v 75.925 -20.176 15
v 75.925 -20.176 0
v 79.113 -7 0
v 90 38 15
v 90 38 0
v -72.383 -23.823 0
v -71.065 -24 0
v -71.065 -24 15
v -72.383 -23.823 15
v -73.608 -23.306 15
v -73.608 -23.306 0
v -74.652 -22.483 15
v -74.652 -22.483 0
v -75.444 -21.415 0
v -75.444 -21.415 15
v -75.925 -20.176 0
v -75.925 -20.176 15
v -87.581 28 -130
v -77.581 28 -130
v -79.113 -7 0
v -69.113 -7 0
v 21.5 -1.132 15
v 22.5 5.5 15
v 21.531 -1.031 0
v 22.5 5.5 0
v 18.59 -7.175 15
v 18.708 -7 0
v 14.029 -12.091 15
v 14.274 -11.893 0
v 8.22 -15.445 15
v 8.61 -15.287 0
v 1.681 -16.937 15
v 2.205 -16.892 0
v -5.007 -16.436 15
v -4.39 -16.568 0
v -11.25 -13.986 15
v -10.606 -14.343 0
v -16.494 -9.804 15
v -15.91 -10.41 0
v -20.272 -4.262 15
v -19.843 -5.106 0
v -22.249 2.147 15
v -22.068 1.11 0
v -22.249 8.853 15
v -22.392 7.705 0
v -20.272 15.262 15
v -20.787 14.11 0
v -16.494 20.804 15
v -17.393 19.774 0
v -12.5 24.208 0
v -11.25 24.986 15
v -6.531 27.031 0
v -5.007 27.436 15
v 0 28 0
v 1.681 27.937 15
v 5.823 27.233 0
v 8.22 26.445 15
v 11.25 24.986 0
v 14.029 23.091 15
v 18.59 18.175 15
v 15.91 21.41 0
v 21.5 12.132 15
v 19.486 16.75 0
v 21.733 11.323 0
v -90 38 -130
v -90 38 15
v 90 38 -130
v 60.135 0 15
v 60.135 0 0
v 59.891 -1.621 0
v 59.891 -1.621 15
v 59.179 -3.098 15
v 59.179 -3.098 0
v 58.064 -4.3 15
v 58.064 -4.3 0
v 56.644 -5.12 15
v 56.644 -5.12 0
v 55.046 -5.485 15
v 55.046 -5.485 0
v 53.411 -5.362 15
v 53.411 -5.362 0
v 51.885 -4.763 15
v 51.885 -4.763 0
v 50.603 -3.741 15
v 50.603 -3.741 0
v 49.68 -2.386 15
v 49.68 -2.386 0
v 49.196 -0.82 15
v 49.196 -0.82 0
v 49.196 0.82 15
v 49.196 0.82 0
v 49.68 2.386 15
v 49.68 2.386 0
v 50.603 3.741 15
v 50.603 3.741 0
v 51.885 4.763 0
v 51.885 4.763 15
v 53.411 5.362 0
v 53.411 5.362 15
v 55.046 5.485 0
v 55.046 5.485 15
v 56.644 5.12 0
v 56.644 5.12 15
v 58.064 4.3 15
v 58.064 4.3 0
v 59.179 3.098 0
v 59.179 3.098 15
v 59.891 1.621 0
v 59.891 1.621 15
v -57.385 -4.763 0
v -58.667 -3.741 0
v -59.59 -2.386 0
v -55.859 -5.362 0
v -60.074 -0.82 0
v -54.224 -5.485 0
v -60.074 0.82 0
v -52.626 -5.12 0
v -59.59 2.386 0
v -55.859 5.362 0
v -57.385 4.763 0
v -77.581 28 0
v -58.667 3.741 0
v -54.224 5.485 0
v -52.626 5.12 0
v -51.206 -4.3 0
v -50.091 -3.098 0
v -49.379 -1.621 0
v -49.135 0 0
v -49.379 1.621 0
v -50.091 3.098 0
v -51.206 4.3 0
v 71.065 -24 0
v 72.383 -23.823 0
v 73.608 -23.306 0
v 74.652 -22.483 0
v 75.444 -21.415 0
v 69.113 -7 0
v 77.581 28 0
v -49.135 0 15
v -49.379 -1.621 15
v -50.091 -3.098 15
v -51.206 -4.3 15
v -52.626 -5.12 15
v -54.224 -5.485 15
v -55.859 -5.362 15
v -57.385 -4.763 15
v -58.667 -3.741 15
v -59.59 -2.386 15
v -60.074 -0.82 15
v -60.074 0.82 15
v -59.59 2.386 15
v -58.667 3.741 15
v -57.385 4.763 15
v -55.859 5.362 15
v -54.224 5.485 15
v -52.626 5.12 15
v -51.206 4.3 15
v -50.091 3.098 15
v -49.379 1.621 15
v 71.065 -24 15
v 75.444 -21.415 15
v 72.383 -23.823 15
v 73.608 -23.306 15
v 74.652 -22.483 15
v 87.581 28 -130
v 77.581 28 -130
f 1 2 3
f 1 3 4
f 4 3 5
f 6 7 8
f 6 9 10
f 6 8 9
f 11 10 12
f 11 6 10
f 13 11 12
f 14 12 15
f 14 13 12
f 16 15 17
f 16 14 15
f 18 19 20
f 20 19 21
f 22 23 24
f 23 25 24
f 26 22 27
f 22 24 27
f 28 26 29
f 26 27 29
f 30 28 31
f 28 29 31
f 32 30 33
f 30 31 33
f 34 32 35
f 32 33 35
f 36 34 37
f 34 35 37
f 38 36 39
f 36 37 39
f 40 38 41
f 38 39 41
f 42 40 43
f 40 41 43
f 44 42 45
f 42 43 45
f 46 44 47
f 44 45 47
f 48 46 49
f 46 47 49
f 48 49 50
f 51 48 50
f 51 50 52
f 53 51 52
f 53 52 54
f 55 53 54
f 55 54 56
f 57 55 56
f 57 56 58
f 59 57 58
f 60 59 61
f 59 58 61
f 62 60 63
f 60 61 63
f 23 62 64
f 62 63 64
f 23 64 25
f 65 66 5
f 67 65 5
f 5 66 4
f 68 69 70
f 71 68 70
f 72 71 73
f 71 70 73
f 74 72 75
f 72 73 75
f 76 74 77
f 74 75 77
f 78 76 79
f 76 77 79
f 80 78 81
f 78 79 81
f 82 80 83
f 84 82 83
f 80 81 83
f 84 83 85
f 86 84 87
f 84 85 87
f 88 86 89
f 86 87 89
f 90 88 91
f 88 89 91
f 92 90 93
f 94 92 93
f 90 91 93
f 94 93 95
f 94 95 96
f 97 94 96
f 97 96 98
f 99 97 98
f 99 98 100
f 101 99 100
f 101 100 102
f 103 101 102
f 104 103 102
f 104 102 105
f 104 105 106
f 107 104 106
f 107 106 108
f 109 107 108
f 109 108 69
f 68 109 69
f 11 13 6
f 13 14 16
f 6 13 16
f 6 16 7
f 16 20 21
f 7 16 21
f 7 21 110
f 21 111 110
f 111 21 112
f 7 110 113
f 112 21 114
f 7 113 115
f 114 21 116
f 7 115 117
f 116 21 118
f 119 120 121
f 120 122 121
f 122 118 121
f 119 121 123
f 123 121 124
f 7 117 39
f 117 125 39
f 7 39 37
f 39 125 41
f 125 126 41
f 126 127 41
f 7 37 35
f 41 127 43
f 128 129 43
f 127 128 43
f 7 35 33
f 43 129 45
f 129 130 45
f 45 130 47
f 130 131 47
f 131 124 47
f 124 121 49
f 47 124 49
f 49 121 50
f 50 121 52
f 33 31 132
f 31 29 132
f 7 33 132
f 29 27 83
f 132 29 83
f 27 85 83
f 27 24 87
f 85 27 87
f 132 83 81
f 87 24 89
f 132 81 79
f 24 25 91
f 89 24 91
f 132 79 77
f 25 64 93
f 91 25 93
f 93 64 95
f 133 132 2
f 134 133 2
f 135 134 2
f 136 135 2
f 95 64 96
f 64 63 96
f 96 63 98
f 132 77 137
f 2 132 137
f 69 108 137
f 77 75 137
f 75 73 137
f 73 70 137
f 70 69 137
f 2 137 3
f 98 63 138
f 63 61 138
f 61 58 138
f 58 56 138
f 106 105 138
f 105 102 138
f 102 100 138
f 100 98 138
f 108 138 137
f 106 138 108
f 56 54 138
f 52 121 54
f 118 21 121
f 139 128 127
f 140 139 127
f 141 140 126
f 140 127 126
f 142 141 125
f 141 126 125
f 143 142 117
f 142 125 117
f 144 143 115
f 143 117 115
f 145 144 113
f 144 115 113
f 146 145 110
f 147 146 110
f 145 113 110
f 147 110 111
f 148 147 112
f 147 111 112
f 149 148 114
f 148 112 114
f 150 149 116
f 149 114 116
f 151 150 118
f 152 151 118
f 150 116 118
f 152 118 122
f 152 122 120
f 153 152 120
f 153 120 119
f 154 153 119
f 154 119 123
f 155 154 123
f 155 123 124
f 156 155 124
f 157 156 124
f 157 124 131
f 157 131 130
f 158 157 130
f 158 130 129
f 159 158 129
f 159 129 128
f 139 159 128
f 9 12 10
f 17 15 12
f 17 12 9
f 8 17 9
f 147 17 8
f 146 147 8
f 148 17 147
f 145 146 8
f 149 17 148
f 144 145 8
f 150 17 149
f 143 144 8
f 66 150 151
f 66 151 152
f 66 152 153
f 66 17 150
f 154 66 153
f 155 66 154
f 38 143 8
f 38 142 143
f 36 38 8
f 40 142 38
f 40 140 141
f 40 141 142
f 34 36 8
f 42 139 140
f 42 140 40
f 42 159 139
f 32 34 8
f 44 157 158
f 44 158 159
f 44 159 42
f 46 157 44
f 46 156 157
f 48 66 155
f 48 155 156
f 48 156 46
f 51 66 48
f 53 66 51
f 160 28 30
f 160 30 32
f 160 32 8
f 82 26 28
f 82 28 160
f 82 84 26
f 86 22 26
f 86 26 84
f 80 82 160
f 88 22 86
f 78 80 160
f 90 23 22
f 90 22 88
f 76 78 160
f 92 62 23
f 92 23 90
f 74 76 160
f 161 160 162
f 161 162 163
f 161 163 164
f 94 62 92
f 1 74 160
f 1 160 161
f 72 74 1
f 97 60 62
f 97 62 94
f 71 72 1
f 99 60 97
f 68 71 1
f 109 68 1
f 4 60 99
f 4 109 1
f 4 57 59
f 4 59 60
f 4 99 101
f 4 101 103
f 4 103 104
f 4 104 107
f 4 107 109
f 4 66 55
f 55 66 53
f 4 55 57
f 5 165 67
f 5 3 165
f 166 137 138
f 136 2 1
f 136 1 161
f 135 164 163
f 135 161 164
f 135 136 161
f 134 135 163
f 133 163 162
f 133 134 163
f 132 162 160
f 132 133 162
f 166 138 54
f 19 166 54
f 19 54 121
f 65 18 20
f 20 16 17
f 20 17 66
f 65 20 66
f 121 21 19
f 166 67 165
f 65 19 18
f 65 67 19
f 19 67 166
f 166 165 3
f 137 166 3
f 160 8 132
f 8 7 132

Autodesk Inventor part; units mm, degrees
ref_plane "YZ Plane" through (0, 0, 0) normal (1, 0, 0) x (0, 1, 0)
ref_plane "XZ Plane" through (0, 0, 0) normal (0, 1, 0) x (-1, 0, 0)
sketch "hole pattern" plane through (0, 0, 0) normal (0, 0, 1) x (1, 0, 0)
  circle A0 centre (-54.635, 0) radius 5 construction
  line L0 (-126, 0) -> (126, 0) projected
  line L1 (0, -37.4097) -> (0, 50.5683) projected
  circle A1 centre (0, 5.5) radius 22.5
  line L2 (-54.635, -5) -> (0, -5) construction
  circle A2 centre (54.635, 0) radius 5 construction
  line L3 (-90, 38) -> (90, 38)
  line L4 (-90, 38) -> (-75.9252, -20.1758)
  line L5 (-71.0654, -24) -> (71.0654, -24)
  line L6 (75.9252, -20.1758) -> (90, 38)
  circle A3 centre (-54.635, 0) radius 15 construction
  circle A4 centre (54.635, 0) radius 15 construction
  circle A5 centre (-54.635, 0) radius 5.5
  circle A6 centre (54.635, 0) radius 5.5
  arc A7 (71.0654, -24) -> (75.9252, -20.1758) centre (71.0654, -19) ccw
  arc A8 (-75.9252, -20.1758) -> (-71.0654, -24) centre (-71.0654, -19) ccw
  point P0 (0, 0)
  point P1 (-75, -24)
  point P2 (75, -24)
  dimension "d1" = 10
  dimension "d0" = 54.635
  dimension "d2" = 45
  dimension "topWidth" = 180
  dimension "d38" = 90
  dimension "d39" = 32.5
  dimension "d40" = 10.5
  dimension "d41" = 24
  dimension "d42" = 30
  dimension "d43" = 30
  dimension "d44" = 11
  dimension "d45" = 11
  dimension "d46" = 150
extrude "Extrusion1" add sketch "hole pattern" along normal blind 15 contours L4 L3 L1 A1 L0 A5 | L0 A5 A1 L1 L5 A8 L4 | L3 L6 L0 A6 A1 L1 | L1 A1 L0 A6 L6 A7 L5
sketch "Sketch2" plane through (0, 0, 0) normal (0, 0, -1) x (-1, 0, 0)
  line L0 (75.9252, -20.1758) -> (90, 38) projected
  line L1 (90, 38) -> (-90, 38) projected
  line L2 (-90, 38) -> (90, 38) projected
  line L3 (-90, 38) -> (90, 38)
  line L4 (-77.5806, 28) -> (77.5806, 28)
  line L5 (-69.1129, -7) -> (-77.5806, 28)
  line L6 (-69.1129, -7) -> (-79.1129, -7)
  line L7 (90, 38) -> (75.9252, -20.1758) projected
  line L8 (79.1129, -7) -> (69.1129, -7)
  line L9 (69.1129, -7) -> (77.5806, 28)
  line L10 (-79.1129, -7) -> (-90, 38)
  line L11 (-90, 38) -> (-75.9252, -20.1758) projected
  line L12 (79.1129, -7) -> (90, 38)
  point P0 (0, 0)
  dimension "d50" = 10
  dimension "d53" = 45
  dimension "d54" = 10
extrude "Extrusion2" add sketch "Sketch2" along normal blind 130
ref_plane "Work Plane1" through (0, -334, 0) normal (-1, 0, 0) x (0, 0, -1)
sketch "Sketch5" plane through (0, -334, 0) normal (-1, 0, 0) x (0, 0, -1)
  line L0 (0, -327) -> (130, -327) projected
  line L1 (130, -362) -> (130, -327) projected
  line L2 (0, -327) -> (130, -327)
  line L3 (130, -362) -> (130, -327.7477)
  line L4 (130, -362) -> (0, -327)
  point P0 (0, -334)
extrude "Extrusion3" cut sketch "Sketch5" along normal through all both and the other way through all
equation "\"d38\" = 0.5 * topWidth"
properties part number "Brake_Light_Base_Plate"
